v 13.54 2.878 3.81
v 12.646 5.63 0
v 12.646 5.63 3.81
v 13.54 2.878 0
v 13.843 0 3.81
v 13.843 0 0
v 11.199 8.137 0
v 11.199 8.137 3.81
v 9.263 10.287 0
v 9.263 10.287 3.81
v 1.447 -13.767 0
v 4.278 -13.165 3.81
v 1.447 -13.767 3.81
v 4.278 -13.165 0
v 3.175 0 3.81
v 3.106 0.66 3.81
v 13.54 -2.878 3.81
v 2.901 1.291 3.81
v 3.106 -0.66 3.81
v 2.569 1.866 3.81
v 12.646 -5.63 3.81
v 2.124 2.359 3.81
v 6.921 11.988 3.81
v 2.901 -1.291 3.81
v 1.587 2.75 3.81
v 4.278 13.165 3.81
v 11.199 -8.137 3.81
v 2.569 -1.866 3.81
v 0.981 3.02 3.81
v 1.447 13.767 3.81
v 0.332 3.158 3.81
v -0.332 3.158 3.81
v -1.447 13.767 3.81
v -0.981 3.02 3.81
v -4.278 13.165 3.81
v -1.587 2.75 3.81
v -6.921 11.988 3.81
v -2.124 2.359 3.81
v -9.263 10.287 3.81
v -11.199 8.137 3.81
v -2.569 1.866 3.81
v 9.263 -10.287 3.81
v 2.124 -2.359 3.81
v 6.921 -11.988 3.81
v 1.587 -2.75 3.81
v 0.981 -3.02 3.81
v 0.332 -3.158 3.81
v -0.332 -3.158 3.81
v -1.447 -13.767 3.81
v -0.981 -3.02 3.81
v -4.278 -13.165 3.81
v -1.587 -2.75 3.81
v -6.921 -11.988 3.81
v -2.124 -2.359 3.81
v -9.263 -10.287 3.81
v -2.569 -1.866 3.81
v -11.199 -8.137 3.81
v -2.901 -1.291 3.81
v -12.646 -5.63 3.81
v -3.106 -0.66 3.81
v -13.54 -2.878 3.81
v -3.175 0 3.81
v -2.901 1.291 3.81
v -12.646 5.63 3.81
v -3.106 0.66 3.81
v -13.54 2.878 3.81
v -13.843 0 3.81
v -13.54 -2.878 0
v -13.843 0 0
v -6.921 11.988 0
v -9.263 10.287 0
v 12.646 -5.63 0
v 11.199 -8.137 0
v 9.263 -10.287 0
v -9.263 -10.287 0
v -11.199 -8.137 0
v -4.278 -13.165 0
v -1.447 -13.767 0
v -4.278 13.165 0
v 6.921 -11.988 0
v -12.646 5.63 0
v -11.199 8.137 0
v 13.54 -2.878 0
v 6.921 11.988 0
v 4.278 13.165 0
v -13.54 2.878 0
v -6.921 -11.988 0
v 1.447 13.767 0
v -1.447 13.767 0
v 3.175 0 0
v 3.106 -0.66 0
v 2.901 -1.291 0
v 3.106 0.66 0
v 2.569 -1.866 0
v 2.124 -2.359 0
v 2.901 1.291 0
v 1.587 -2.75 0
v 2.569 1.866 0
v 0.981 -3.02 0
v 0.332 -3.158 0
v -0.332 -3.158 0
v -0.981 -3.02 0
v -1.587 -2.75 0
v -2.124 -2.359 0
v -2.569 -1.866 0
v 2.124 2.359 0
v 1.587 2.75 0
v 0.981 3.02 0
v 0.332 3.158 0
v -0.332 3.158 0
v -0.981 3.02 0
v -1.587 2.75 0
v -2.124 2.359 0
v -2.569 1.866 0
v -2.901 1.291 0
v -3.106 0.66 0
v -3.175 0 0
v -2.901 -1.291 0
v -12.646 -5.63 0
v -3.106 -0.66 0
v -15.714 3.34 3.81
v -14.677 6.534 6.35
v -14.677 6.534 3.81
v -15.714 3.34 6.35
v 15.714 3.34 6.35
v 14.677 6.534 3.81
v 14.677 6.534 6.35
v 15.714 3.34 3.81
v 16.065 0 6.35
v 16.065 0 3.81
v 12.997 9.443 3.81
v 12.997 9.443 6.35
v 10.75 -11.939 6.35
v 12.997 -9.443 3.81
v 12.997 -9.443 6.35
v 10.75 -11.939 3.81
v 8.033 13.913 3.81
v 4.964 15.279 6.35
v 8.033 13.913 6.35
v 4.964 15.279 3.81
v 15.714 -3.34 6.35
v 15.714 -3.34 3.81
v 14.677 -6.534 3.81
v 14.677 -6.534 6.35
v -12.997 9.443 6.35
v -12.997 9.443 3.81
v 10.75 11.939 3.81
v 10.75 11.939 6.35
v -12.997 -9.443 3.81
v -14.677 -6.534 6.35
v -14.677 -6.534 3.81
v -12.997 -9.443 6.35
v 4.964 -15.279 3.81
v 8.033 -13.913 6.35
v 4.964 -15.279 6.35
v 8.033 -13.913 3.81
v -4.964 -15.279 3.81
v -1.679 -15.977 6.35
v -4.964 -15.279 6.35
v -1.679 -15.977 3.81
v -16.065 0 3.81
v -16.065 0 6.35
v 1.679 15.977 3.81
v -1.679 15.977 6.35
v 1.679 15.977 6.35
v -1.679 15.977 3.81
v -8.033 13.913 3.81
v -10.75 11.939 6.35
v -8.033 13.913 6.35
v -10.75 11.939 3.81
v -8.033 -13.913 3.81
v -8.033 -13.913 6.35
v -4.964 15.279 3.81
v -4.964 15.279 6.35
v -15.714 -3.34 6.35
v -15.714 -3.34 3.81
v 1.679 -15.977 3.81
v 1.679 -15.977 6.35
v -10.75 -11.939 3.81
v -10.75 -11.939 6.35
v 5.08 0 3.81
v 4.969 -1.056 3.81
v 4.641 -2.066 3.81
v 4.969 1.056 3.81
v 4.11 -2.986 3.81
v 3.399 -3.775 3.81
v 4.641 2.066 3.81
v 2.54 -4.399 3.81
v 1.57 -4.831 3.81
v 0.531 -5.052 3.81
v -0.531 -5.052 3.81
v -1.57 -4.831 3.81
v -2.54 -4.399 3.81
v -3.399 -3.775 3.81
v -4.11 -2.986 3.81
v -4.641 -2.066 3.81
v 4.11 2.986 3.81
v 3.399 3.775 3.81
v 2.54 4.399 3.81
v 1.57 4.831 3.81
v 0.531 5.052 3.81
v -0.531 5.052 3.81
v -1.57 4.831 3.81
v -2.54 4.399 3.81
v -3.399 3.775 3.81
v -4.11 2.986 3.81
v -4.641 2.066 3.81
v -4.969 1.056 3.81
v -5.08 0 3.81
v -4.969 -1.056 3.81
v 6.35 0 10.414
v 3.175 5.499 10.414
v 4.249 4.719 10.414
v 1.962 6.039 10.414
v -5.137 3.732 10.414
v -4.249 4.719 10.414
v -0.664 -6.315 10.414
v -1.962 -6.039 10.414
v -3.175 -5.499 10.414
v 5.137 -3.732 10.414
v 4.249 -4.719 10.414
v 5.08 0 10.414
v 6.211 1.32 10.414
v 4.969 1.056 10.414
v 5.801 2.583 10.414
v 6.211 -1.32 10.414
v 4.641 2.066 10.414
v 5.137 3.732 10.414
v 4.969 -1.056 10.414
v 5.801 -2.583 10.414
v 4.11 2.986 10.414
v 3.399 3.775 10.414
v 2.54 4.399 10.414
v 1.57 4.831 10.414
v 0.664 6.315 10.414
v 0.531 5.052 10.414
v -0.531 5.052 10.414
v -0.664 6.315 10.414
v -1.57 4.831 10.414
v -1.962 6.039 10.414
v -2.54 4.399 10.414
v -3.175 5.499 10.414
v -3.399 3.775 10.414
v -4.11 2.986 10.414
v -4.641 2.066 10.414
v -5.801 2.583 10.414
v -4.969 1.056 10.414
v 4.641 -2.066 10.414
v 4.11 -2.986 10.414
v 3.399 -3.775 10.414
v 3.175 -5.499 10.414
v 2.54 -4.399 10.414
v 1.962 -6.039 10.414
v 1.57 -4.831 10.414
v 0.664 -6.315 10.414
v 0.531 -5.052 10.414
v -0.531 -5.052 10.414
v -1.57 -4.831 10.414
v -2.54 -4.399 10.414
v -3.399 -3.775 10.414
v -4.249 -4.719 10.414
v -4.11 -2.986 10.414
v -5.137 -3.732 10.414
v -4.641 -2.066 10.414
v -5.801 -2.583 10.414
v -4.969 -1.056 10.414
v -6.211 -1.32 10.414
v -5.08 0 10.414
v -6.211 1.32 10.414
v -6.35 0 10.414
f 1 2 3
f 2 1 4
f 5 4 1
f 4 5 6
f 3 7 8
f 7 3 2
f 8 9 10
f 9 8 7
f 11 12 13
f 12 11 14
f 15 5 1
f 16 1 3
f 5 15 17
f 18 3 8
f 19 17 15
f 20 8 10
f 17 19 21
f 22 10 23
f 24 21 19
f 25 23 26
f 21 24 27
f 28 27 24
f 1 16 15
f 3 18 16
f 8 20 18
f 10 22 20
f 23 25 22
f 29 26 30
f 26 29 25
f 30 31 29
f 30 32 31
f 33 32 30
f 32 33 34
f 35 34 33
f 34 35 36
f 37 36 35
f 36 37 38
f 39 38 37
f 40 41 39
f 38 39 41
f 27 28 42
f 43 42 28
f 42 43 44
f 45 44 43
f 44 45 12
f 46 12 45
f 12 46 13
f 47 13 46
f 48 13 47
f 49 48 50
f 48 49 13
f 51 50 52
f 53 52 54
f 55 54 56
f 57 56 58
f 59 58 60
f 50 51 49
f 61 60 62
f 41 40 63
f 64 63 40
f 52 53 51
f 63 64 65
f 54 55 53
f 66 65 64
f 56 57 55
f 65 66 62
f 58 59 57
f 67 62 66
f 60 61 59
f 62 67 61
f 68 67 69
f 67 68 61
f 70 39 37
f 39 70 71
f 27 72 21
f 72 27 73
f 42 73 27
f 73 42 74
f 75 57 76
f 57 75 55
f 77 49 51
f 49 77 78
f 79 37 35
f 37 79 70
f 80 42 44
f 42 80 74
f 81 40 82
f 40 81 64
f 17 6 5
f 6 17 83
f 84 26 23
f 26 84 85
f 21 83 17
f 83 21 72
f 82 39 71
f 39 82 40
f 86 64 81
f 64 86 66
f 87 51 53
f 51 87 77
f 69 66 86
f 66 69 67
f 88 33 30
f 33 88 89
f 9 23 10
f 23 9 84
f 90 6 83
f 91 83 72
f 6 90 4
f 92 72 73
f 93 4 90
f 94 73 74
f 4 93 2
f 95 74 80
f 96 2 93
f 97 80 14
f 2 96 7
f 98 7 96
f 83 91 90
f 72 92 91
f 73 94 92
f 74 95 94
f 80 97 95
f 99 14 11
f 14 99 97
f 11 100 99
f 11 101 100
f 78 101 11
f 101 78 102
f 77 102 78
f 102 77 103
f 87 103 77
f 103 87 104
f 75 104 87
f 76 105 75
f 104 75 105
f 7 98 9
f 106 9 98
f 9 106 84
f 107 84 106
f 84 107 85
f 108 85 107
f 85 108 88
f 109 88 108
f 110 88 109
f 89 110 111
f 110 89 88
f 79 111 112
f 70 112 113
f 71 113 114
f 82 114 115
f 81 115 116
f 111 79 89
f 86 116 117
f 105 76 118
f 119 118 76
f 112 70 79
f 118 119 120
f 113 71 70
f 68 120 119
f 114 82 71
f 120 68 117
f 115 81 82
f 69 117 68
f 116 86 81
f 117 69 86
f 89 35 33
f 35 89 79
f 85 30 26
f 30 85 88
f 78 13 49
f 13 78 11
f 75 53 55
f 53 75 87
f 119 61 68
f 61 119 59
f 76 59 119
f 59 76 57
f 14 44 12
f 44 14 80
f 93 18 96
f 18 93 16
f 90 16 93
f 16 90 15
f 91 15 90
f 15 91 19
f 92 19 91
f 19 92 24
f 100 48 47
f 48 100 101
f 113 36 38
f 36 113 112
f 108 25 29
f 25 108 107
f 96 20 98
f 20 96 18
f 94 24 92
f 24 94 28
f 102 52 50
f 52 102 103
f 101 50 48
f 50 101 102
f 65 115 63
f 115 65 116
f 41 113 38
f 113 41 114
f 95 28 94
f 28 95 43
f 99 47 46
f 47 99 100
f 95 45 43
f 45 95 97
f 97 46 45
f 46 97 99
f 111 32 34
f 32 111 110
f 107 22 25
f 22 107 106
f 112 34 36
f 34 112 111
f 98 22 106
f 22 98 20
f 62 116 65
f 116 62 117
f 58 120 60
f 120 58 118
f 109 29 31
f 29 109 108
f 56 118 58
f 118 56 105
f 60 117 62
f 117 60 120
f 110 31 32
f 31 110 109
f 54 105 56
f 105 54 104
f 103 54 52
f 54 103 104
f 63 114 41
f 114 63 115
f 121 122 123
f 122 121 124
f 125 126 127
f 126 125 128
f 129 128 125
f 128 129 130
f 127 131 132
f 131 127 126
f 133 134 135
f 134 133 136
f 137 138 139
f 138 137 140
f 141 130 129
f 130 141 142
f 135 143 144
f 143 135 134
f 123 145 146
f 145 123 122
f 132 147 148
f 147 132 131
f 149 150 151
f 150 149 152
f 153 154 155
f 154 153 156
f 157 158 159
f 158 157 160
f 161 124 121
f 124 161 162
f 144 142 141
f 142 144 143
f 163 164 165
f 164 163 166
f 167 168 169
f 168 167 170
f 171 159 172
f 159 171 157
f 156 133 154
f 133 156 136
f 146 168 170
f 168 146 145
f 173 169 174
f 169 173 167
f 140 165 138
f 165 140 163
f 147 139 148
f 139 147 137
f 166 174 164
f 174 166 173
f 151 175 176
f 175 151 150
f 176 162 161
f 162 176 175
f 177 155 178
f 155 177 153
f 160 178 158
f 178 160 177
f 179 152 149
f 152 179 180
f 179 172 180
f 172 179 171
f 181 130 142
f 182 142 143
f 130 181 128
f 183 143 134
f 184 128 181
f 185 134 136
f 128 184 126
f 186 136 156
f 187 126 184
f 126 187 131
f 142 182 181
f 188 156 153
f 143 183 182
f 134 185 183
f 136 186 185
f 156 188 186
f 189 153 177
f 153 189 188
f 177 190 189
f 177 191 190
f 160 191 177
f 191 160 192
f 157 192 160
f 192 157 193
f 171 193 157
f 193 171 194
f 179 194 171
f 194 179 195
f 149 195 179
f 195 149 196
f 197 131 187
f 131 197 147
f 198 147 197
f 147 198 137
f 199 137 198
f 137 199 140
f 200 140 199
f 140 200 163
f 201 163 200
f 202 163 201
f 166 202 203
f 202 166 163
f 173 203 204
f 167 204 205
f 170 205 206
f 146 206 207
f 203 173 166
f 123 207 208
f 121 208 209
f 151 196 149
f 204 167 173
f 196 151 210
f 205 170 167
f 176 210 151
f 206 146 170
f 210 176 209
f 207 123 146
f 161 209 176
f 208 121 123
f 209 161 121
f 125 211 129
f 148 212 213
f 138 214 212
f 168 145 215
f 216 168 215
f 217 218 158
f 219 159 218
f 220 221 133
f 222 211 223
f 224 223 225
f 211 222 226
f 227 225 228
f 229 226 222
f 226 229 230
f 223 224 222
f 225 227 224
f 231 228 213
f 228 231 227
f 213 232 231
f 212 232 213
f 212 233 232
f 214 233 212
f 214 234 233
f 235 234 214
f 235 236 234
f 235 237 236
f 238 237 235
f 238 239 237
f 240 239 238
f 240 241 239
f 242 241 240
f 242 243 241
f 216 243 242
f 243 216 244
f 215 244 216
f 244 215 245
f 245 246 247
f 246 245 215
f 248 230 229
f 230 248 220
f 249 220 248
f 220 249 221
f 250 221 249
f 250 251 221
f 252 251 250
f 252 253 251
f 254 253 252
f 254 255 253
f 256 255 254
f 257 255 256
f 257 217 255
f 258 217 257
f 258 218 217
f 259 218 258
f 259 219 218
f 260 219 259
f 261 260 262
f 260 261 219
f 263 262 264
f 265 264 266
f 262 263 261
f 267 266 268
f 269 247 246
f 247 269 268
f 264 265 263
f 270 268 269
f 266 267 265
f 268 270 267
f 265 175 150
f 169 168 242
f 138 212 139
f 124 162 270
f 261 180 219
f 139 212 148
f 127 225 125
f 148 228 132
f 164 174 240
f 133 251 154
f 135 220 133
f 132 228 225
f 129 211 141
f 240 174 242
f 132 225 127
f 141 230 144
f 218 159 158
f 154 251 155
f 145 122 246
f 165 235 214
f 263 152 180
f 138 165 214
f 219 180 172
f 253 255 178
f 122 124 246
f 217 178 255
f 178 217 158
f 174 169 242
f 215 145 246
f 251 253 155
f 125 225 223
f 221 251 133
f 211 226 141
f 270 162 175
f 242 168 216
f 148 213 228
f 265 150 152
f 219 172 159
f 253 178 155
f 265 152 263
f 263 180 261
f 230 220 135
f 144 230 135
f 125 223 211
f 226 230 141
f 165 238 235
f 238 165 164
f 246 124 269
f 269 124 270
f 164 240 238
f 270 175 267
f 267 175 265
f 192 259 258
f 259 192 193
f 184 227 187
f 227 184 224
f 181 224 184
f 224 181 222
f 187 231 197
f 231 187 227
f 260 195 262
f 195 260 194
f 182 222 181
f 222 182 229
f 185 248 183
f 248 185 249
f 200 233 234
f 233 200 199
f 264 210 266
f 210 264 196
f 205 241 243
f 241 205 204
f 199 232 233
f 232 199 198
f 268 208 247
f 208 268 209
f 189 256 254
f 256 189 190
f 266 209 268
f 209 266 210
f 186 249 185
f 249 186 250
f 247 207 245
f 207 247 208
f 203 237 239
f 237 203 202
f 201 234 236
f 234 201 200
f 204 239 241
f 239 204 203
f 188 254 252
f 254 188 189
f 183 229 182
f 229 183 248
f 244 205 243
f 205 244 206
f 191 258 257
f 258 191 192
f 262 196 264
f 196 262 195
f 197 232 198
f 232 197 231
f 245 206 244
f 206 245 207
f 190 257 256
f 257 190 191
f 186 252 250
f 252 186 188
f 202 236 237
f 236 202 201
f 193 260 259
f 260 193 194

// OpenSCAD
outerDiameter = 1.265;
coneTopDiameter = 0.5;
innerLipDiameter = 1.09;
lipDepth = 0.15;
supportDepth = 0.1;
coneDepth = 0.16;
bigHoleDiameter = 0.4;
littleHoleDiameter = 0.25;

mmToInch = 25.4;
$fn=30;

scale (v = [mmToInch, mmToInch, mmToInch])
{
	union ()
	{
		difference()
		{
				cylinder( lipDepth, r = innerLipDiameter/2);

			cylinder( lipDepth +.01, r = littleHoleDiameter/2);
		}
		translate( v = [0.0, 0.0, lipDepth])
		{
			difference()
			{
			union()
			{
				cylinder(supportDepth, r = outerDiameter/2);
				translate( v = [0.0, 0.0, supportDepth])
					cylinder(coneDepth, outerDiameter/2, coneTopDiameter/2);
			}
				cylinder(coneDepth + supportDepth + 0.01, r = bigHoleDiameter/2);
			}
		}
	}
}
